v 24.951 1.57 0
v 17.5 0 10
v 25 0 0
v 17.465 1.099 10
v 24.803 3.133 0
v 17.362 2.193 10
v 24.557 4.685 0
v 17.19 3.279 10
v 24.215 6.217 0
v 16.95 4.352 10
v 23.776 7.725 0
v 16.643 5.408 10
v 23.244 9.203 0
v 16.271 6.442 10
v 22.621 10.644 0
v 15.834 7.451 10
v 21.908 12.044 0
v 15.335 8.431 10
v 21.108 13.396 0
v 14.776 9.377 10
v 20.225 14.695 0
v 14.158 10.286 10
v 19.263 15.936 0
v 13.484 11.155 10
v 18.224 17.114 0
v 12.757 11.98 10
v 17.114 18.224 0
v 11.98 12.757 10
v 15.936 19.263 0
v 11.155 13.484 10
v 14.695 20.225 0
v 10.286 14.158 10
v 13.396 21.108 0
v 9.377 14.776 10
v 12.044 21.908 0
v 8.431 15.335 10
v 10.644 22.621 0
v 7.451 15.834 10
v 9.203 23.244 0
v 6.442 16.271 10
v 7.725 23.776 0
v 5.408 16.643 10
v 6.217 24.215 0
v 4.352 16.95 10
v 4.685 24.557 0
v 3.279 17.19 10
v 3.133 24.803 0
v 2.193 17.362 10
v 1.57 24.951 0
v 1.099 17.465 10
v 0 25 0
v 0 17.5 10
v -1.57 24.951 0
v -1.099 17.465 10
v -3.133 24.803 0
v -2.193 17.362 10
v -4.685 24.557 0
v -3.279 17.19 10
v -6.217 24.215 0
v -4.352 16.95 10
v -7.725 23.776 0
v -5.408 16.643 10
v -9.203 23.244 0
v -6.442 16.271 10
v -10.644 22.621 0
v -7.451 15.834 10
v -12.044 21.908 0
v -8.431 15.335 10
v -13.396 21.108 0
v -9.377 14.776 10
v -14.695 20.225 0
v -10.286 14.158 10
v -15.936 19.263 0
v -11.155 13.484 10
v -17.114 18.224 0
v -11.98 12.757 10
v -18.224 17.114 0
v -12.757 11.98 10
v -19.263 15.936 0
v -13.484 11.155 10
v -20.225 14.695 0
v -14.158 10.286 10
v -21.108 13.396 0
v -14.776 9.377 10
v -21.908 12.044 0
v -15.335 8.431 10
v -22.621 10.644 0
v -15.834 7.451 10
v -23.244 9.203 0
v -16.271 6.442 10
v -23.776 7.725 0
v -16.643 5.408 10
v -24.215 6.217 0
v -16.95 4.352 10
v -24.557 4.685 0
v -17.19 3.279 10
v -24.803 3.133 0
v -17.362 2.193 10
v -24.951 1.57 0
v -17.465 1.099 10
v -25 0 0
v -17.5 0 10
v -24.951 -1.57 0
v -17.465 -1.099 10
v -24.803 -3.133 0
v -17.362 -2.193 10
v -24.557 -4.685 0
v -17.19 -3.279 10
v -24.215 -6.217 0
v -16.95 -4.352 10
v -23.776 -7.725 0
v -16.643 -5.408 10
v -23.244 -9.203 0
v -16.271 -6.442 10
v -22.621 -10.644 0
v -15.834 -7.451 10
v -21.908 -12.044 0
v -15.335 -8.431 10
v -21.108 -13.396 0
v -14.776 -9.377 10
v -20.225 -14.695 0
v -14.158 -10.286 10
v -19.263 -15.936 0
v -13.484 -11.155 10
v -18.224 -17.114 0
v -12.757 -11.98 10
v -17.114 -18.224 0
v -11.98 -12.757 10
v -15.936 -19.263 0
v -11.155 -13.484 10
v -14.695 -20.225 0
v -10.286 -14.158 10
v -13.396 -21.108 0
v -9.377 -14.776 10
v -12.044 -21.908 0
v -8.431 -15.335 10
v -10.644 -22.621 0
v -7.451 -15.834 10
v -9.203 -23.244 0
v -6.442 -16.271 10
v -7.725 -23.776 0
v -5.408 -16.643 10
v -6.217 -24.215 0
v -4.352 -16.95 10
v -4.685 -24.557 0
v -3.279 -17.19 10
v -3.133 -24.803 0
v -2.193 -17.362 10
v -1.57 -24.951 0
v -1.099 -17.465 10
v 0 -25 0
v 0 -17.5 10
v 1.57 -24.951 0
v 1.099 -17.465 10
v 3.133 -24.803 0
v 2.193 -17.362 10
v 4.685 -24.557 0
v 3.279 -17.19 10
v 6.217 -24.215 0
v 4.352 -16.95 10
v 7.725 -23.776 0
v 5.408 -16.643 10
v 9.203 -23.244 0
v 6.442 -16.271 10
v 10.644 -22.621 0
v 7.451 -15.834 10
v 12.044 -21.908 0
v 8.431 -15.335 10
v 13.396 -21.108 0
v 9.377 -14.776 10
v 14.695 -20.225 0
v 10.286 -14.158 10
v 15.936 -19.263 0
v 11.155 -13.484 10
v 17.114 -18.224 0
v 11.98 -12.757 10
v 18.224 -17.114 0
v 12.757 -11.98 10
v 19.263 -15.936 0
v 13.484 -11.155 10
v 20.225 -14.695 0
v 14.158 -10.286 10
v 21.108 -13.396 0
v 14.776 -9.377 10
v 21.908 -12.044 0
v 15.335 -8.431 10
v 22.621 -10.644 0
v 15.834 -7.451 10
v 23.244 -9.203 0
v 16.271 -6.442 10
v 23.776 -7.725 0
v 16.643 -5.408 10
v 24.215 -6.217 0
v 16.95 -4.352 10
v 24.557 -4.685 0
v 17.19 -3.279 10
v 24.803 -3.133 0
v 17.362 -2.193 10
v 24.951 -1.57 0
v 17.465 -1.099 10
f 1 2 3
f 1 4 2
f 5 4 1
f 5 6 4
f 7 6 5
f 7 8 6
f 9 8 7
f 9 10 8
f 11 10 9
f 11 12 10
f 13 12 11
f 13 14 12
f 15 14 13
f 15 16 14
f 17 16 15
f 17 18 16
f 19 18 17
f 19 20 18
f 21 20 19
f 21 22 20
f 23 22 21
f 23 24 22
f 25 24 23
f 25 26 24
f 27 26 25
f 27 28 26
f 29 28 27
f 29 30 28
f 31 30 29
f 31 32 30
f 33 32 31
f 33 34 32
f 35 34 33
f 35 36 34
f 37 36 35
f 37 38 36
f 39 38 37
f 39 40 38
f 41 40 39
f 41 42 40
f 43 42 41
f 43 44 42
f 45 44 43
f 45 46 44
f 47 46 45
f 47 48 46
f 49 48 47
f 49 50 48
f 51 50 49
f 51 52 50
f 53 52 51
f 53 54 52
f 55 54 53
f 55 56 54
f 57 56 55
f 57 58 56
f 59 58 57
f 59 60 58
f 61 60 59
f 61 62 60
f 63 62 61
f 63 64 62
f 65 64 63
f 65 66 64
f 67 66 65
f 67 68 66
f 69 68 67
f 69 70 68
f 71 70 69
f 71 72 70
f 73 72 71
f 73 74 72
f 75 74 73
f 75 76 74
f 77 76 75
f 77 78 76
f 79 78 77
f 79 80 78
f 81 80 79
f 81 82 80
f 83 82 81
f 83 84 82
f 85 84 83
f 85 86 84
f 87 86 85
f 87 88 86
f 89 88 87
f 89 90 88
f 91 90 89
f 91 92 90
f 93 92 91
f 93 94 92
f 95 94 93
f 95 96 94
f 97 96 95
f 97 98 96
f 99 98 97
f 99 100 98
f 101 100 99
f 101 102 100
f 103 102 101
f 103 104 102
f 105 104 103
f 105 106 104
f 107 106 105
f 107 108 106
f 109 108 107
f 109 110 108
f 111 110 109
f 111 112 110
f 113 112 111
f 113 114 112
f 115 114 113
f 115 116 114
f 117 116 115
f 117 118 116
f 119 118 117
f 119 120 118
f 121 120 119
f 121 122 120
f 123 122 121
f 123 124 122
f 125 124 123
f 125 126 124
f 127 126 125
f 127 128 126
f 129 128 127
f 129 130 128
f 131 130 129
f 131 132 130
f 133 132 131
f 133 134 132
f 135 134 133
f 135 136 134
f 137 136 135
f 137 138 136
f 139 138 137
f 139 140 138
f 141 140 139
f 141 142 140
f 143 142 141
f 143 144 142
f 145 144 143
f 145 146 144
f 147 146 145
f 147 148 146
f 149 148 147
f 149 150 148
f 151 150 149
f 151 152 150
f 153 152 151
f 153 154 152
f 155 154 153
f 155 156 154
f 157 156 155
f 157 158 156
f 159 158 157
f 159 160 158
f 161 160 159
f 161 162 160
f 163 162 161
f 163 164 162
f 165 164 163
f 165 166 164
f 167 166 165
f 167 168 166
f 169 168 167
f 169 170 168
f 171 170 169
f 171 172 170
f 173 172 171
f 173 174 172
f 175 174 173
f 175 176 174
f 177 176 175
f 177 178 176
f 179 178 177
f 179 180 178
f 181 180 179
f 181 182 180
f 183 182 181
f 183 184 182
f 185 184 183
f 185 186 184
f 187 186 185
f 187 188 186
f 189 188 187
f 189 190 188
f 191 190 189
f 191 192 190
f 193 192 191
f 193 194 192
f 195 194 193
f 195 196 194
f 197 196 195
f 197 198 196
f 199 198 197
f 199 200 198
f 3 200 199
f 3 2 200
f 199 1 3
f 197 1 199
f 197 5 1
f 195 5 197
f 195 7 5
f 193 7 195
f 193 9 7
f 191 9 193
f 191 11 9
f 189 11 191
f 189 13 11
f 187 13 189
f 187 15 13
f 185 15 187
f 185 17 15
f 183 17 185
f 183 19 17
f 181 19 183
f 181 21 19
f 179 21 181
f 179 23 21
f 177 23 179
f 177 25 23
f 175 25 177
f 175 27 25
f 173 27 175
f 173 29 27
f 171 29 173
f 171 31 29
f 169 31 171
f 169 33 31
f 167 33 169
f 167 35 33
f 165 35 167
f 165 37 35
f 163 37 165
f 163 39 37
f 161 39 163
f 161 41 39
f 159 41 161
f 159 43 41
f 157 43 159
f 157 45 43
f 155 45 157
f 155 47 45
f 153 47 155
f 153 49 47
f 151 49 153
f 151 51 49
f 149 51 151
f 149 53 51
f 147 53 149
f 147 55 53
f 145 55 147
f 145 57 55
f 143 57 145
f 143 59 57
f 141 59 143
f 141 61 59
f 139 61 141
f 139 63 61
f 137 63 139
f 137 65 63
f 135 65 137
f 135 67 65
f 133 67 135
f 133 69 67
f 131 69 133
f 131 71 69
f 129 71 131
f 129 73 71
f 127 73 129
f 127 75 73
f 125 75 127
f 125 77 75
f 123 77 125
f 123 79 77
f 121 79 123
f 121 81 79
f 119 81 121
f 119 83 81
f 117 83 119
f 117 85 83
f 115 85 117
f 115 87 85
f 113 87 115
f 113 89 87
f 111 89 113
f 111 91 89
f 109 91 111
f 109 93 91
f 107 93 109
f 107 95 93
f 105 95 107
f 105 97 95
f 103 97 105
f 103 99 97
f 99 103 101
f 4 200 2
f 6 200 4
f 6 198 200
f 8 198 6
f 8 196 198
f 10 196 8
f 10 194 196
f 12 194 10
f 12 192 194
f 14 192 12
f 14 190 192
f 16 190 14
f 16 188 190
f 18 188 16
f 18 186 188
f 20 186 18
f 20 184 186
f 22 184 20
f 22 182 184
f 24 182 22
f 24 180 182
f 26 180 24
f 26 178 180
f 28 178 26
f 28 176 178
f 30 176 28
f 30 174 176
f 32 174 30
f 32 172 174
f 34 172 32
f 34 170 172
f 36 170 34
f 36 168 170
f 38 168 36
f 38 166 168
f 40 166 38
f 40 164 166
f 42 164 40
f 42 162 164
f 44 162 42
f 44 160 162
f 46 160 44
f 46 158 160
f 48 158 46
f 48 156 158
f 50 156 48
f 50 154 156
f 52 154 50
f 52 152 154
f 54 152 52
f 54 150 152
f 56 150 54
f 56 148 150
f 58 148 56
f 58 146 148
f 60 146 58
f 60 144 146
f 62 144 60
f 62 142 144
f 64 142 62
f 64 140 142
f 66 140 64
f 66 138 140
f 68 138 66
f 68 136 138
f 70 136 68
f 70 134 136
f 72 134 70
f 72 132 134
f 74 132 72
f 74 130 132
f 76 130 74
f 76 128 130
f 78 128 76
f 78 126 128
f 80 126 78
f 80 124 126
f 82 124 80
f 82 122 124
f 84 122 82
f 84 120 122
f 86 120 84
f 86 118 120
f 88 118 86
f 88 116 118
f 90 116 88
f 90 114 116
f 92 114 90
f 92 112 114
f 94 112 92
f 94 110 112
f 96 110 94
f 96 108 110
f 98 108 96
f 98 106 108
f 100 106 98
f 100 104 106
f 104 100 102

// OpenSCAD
// --- Base Parameters ---
// Modify these values by measuring your real object

bottom_diameter = 50; // Width at the bottom (on the table)
top_diameter = 35;    // Width at the top (where the figure sits)
height = 10;          // Total height of the base

// --- Quality ---
resolution = 100; // Higher number means a smoother circle ($fn)

// --- Model Generation ---
module display_base() {
    // The cylinder function with d1 and d2 creates a truncated cone
    cylinder(
        h = height,
        d1 = bottom_diameter,
        d2 = top_diameter,
        center = false,
        $fn = resolution
    );
}

// Call the function to render the object
color("white")
display_base();
